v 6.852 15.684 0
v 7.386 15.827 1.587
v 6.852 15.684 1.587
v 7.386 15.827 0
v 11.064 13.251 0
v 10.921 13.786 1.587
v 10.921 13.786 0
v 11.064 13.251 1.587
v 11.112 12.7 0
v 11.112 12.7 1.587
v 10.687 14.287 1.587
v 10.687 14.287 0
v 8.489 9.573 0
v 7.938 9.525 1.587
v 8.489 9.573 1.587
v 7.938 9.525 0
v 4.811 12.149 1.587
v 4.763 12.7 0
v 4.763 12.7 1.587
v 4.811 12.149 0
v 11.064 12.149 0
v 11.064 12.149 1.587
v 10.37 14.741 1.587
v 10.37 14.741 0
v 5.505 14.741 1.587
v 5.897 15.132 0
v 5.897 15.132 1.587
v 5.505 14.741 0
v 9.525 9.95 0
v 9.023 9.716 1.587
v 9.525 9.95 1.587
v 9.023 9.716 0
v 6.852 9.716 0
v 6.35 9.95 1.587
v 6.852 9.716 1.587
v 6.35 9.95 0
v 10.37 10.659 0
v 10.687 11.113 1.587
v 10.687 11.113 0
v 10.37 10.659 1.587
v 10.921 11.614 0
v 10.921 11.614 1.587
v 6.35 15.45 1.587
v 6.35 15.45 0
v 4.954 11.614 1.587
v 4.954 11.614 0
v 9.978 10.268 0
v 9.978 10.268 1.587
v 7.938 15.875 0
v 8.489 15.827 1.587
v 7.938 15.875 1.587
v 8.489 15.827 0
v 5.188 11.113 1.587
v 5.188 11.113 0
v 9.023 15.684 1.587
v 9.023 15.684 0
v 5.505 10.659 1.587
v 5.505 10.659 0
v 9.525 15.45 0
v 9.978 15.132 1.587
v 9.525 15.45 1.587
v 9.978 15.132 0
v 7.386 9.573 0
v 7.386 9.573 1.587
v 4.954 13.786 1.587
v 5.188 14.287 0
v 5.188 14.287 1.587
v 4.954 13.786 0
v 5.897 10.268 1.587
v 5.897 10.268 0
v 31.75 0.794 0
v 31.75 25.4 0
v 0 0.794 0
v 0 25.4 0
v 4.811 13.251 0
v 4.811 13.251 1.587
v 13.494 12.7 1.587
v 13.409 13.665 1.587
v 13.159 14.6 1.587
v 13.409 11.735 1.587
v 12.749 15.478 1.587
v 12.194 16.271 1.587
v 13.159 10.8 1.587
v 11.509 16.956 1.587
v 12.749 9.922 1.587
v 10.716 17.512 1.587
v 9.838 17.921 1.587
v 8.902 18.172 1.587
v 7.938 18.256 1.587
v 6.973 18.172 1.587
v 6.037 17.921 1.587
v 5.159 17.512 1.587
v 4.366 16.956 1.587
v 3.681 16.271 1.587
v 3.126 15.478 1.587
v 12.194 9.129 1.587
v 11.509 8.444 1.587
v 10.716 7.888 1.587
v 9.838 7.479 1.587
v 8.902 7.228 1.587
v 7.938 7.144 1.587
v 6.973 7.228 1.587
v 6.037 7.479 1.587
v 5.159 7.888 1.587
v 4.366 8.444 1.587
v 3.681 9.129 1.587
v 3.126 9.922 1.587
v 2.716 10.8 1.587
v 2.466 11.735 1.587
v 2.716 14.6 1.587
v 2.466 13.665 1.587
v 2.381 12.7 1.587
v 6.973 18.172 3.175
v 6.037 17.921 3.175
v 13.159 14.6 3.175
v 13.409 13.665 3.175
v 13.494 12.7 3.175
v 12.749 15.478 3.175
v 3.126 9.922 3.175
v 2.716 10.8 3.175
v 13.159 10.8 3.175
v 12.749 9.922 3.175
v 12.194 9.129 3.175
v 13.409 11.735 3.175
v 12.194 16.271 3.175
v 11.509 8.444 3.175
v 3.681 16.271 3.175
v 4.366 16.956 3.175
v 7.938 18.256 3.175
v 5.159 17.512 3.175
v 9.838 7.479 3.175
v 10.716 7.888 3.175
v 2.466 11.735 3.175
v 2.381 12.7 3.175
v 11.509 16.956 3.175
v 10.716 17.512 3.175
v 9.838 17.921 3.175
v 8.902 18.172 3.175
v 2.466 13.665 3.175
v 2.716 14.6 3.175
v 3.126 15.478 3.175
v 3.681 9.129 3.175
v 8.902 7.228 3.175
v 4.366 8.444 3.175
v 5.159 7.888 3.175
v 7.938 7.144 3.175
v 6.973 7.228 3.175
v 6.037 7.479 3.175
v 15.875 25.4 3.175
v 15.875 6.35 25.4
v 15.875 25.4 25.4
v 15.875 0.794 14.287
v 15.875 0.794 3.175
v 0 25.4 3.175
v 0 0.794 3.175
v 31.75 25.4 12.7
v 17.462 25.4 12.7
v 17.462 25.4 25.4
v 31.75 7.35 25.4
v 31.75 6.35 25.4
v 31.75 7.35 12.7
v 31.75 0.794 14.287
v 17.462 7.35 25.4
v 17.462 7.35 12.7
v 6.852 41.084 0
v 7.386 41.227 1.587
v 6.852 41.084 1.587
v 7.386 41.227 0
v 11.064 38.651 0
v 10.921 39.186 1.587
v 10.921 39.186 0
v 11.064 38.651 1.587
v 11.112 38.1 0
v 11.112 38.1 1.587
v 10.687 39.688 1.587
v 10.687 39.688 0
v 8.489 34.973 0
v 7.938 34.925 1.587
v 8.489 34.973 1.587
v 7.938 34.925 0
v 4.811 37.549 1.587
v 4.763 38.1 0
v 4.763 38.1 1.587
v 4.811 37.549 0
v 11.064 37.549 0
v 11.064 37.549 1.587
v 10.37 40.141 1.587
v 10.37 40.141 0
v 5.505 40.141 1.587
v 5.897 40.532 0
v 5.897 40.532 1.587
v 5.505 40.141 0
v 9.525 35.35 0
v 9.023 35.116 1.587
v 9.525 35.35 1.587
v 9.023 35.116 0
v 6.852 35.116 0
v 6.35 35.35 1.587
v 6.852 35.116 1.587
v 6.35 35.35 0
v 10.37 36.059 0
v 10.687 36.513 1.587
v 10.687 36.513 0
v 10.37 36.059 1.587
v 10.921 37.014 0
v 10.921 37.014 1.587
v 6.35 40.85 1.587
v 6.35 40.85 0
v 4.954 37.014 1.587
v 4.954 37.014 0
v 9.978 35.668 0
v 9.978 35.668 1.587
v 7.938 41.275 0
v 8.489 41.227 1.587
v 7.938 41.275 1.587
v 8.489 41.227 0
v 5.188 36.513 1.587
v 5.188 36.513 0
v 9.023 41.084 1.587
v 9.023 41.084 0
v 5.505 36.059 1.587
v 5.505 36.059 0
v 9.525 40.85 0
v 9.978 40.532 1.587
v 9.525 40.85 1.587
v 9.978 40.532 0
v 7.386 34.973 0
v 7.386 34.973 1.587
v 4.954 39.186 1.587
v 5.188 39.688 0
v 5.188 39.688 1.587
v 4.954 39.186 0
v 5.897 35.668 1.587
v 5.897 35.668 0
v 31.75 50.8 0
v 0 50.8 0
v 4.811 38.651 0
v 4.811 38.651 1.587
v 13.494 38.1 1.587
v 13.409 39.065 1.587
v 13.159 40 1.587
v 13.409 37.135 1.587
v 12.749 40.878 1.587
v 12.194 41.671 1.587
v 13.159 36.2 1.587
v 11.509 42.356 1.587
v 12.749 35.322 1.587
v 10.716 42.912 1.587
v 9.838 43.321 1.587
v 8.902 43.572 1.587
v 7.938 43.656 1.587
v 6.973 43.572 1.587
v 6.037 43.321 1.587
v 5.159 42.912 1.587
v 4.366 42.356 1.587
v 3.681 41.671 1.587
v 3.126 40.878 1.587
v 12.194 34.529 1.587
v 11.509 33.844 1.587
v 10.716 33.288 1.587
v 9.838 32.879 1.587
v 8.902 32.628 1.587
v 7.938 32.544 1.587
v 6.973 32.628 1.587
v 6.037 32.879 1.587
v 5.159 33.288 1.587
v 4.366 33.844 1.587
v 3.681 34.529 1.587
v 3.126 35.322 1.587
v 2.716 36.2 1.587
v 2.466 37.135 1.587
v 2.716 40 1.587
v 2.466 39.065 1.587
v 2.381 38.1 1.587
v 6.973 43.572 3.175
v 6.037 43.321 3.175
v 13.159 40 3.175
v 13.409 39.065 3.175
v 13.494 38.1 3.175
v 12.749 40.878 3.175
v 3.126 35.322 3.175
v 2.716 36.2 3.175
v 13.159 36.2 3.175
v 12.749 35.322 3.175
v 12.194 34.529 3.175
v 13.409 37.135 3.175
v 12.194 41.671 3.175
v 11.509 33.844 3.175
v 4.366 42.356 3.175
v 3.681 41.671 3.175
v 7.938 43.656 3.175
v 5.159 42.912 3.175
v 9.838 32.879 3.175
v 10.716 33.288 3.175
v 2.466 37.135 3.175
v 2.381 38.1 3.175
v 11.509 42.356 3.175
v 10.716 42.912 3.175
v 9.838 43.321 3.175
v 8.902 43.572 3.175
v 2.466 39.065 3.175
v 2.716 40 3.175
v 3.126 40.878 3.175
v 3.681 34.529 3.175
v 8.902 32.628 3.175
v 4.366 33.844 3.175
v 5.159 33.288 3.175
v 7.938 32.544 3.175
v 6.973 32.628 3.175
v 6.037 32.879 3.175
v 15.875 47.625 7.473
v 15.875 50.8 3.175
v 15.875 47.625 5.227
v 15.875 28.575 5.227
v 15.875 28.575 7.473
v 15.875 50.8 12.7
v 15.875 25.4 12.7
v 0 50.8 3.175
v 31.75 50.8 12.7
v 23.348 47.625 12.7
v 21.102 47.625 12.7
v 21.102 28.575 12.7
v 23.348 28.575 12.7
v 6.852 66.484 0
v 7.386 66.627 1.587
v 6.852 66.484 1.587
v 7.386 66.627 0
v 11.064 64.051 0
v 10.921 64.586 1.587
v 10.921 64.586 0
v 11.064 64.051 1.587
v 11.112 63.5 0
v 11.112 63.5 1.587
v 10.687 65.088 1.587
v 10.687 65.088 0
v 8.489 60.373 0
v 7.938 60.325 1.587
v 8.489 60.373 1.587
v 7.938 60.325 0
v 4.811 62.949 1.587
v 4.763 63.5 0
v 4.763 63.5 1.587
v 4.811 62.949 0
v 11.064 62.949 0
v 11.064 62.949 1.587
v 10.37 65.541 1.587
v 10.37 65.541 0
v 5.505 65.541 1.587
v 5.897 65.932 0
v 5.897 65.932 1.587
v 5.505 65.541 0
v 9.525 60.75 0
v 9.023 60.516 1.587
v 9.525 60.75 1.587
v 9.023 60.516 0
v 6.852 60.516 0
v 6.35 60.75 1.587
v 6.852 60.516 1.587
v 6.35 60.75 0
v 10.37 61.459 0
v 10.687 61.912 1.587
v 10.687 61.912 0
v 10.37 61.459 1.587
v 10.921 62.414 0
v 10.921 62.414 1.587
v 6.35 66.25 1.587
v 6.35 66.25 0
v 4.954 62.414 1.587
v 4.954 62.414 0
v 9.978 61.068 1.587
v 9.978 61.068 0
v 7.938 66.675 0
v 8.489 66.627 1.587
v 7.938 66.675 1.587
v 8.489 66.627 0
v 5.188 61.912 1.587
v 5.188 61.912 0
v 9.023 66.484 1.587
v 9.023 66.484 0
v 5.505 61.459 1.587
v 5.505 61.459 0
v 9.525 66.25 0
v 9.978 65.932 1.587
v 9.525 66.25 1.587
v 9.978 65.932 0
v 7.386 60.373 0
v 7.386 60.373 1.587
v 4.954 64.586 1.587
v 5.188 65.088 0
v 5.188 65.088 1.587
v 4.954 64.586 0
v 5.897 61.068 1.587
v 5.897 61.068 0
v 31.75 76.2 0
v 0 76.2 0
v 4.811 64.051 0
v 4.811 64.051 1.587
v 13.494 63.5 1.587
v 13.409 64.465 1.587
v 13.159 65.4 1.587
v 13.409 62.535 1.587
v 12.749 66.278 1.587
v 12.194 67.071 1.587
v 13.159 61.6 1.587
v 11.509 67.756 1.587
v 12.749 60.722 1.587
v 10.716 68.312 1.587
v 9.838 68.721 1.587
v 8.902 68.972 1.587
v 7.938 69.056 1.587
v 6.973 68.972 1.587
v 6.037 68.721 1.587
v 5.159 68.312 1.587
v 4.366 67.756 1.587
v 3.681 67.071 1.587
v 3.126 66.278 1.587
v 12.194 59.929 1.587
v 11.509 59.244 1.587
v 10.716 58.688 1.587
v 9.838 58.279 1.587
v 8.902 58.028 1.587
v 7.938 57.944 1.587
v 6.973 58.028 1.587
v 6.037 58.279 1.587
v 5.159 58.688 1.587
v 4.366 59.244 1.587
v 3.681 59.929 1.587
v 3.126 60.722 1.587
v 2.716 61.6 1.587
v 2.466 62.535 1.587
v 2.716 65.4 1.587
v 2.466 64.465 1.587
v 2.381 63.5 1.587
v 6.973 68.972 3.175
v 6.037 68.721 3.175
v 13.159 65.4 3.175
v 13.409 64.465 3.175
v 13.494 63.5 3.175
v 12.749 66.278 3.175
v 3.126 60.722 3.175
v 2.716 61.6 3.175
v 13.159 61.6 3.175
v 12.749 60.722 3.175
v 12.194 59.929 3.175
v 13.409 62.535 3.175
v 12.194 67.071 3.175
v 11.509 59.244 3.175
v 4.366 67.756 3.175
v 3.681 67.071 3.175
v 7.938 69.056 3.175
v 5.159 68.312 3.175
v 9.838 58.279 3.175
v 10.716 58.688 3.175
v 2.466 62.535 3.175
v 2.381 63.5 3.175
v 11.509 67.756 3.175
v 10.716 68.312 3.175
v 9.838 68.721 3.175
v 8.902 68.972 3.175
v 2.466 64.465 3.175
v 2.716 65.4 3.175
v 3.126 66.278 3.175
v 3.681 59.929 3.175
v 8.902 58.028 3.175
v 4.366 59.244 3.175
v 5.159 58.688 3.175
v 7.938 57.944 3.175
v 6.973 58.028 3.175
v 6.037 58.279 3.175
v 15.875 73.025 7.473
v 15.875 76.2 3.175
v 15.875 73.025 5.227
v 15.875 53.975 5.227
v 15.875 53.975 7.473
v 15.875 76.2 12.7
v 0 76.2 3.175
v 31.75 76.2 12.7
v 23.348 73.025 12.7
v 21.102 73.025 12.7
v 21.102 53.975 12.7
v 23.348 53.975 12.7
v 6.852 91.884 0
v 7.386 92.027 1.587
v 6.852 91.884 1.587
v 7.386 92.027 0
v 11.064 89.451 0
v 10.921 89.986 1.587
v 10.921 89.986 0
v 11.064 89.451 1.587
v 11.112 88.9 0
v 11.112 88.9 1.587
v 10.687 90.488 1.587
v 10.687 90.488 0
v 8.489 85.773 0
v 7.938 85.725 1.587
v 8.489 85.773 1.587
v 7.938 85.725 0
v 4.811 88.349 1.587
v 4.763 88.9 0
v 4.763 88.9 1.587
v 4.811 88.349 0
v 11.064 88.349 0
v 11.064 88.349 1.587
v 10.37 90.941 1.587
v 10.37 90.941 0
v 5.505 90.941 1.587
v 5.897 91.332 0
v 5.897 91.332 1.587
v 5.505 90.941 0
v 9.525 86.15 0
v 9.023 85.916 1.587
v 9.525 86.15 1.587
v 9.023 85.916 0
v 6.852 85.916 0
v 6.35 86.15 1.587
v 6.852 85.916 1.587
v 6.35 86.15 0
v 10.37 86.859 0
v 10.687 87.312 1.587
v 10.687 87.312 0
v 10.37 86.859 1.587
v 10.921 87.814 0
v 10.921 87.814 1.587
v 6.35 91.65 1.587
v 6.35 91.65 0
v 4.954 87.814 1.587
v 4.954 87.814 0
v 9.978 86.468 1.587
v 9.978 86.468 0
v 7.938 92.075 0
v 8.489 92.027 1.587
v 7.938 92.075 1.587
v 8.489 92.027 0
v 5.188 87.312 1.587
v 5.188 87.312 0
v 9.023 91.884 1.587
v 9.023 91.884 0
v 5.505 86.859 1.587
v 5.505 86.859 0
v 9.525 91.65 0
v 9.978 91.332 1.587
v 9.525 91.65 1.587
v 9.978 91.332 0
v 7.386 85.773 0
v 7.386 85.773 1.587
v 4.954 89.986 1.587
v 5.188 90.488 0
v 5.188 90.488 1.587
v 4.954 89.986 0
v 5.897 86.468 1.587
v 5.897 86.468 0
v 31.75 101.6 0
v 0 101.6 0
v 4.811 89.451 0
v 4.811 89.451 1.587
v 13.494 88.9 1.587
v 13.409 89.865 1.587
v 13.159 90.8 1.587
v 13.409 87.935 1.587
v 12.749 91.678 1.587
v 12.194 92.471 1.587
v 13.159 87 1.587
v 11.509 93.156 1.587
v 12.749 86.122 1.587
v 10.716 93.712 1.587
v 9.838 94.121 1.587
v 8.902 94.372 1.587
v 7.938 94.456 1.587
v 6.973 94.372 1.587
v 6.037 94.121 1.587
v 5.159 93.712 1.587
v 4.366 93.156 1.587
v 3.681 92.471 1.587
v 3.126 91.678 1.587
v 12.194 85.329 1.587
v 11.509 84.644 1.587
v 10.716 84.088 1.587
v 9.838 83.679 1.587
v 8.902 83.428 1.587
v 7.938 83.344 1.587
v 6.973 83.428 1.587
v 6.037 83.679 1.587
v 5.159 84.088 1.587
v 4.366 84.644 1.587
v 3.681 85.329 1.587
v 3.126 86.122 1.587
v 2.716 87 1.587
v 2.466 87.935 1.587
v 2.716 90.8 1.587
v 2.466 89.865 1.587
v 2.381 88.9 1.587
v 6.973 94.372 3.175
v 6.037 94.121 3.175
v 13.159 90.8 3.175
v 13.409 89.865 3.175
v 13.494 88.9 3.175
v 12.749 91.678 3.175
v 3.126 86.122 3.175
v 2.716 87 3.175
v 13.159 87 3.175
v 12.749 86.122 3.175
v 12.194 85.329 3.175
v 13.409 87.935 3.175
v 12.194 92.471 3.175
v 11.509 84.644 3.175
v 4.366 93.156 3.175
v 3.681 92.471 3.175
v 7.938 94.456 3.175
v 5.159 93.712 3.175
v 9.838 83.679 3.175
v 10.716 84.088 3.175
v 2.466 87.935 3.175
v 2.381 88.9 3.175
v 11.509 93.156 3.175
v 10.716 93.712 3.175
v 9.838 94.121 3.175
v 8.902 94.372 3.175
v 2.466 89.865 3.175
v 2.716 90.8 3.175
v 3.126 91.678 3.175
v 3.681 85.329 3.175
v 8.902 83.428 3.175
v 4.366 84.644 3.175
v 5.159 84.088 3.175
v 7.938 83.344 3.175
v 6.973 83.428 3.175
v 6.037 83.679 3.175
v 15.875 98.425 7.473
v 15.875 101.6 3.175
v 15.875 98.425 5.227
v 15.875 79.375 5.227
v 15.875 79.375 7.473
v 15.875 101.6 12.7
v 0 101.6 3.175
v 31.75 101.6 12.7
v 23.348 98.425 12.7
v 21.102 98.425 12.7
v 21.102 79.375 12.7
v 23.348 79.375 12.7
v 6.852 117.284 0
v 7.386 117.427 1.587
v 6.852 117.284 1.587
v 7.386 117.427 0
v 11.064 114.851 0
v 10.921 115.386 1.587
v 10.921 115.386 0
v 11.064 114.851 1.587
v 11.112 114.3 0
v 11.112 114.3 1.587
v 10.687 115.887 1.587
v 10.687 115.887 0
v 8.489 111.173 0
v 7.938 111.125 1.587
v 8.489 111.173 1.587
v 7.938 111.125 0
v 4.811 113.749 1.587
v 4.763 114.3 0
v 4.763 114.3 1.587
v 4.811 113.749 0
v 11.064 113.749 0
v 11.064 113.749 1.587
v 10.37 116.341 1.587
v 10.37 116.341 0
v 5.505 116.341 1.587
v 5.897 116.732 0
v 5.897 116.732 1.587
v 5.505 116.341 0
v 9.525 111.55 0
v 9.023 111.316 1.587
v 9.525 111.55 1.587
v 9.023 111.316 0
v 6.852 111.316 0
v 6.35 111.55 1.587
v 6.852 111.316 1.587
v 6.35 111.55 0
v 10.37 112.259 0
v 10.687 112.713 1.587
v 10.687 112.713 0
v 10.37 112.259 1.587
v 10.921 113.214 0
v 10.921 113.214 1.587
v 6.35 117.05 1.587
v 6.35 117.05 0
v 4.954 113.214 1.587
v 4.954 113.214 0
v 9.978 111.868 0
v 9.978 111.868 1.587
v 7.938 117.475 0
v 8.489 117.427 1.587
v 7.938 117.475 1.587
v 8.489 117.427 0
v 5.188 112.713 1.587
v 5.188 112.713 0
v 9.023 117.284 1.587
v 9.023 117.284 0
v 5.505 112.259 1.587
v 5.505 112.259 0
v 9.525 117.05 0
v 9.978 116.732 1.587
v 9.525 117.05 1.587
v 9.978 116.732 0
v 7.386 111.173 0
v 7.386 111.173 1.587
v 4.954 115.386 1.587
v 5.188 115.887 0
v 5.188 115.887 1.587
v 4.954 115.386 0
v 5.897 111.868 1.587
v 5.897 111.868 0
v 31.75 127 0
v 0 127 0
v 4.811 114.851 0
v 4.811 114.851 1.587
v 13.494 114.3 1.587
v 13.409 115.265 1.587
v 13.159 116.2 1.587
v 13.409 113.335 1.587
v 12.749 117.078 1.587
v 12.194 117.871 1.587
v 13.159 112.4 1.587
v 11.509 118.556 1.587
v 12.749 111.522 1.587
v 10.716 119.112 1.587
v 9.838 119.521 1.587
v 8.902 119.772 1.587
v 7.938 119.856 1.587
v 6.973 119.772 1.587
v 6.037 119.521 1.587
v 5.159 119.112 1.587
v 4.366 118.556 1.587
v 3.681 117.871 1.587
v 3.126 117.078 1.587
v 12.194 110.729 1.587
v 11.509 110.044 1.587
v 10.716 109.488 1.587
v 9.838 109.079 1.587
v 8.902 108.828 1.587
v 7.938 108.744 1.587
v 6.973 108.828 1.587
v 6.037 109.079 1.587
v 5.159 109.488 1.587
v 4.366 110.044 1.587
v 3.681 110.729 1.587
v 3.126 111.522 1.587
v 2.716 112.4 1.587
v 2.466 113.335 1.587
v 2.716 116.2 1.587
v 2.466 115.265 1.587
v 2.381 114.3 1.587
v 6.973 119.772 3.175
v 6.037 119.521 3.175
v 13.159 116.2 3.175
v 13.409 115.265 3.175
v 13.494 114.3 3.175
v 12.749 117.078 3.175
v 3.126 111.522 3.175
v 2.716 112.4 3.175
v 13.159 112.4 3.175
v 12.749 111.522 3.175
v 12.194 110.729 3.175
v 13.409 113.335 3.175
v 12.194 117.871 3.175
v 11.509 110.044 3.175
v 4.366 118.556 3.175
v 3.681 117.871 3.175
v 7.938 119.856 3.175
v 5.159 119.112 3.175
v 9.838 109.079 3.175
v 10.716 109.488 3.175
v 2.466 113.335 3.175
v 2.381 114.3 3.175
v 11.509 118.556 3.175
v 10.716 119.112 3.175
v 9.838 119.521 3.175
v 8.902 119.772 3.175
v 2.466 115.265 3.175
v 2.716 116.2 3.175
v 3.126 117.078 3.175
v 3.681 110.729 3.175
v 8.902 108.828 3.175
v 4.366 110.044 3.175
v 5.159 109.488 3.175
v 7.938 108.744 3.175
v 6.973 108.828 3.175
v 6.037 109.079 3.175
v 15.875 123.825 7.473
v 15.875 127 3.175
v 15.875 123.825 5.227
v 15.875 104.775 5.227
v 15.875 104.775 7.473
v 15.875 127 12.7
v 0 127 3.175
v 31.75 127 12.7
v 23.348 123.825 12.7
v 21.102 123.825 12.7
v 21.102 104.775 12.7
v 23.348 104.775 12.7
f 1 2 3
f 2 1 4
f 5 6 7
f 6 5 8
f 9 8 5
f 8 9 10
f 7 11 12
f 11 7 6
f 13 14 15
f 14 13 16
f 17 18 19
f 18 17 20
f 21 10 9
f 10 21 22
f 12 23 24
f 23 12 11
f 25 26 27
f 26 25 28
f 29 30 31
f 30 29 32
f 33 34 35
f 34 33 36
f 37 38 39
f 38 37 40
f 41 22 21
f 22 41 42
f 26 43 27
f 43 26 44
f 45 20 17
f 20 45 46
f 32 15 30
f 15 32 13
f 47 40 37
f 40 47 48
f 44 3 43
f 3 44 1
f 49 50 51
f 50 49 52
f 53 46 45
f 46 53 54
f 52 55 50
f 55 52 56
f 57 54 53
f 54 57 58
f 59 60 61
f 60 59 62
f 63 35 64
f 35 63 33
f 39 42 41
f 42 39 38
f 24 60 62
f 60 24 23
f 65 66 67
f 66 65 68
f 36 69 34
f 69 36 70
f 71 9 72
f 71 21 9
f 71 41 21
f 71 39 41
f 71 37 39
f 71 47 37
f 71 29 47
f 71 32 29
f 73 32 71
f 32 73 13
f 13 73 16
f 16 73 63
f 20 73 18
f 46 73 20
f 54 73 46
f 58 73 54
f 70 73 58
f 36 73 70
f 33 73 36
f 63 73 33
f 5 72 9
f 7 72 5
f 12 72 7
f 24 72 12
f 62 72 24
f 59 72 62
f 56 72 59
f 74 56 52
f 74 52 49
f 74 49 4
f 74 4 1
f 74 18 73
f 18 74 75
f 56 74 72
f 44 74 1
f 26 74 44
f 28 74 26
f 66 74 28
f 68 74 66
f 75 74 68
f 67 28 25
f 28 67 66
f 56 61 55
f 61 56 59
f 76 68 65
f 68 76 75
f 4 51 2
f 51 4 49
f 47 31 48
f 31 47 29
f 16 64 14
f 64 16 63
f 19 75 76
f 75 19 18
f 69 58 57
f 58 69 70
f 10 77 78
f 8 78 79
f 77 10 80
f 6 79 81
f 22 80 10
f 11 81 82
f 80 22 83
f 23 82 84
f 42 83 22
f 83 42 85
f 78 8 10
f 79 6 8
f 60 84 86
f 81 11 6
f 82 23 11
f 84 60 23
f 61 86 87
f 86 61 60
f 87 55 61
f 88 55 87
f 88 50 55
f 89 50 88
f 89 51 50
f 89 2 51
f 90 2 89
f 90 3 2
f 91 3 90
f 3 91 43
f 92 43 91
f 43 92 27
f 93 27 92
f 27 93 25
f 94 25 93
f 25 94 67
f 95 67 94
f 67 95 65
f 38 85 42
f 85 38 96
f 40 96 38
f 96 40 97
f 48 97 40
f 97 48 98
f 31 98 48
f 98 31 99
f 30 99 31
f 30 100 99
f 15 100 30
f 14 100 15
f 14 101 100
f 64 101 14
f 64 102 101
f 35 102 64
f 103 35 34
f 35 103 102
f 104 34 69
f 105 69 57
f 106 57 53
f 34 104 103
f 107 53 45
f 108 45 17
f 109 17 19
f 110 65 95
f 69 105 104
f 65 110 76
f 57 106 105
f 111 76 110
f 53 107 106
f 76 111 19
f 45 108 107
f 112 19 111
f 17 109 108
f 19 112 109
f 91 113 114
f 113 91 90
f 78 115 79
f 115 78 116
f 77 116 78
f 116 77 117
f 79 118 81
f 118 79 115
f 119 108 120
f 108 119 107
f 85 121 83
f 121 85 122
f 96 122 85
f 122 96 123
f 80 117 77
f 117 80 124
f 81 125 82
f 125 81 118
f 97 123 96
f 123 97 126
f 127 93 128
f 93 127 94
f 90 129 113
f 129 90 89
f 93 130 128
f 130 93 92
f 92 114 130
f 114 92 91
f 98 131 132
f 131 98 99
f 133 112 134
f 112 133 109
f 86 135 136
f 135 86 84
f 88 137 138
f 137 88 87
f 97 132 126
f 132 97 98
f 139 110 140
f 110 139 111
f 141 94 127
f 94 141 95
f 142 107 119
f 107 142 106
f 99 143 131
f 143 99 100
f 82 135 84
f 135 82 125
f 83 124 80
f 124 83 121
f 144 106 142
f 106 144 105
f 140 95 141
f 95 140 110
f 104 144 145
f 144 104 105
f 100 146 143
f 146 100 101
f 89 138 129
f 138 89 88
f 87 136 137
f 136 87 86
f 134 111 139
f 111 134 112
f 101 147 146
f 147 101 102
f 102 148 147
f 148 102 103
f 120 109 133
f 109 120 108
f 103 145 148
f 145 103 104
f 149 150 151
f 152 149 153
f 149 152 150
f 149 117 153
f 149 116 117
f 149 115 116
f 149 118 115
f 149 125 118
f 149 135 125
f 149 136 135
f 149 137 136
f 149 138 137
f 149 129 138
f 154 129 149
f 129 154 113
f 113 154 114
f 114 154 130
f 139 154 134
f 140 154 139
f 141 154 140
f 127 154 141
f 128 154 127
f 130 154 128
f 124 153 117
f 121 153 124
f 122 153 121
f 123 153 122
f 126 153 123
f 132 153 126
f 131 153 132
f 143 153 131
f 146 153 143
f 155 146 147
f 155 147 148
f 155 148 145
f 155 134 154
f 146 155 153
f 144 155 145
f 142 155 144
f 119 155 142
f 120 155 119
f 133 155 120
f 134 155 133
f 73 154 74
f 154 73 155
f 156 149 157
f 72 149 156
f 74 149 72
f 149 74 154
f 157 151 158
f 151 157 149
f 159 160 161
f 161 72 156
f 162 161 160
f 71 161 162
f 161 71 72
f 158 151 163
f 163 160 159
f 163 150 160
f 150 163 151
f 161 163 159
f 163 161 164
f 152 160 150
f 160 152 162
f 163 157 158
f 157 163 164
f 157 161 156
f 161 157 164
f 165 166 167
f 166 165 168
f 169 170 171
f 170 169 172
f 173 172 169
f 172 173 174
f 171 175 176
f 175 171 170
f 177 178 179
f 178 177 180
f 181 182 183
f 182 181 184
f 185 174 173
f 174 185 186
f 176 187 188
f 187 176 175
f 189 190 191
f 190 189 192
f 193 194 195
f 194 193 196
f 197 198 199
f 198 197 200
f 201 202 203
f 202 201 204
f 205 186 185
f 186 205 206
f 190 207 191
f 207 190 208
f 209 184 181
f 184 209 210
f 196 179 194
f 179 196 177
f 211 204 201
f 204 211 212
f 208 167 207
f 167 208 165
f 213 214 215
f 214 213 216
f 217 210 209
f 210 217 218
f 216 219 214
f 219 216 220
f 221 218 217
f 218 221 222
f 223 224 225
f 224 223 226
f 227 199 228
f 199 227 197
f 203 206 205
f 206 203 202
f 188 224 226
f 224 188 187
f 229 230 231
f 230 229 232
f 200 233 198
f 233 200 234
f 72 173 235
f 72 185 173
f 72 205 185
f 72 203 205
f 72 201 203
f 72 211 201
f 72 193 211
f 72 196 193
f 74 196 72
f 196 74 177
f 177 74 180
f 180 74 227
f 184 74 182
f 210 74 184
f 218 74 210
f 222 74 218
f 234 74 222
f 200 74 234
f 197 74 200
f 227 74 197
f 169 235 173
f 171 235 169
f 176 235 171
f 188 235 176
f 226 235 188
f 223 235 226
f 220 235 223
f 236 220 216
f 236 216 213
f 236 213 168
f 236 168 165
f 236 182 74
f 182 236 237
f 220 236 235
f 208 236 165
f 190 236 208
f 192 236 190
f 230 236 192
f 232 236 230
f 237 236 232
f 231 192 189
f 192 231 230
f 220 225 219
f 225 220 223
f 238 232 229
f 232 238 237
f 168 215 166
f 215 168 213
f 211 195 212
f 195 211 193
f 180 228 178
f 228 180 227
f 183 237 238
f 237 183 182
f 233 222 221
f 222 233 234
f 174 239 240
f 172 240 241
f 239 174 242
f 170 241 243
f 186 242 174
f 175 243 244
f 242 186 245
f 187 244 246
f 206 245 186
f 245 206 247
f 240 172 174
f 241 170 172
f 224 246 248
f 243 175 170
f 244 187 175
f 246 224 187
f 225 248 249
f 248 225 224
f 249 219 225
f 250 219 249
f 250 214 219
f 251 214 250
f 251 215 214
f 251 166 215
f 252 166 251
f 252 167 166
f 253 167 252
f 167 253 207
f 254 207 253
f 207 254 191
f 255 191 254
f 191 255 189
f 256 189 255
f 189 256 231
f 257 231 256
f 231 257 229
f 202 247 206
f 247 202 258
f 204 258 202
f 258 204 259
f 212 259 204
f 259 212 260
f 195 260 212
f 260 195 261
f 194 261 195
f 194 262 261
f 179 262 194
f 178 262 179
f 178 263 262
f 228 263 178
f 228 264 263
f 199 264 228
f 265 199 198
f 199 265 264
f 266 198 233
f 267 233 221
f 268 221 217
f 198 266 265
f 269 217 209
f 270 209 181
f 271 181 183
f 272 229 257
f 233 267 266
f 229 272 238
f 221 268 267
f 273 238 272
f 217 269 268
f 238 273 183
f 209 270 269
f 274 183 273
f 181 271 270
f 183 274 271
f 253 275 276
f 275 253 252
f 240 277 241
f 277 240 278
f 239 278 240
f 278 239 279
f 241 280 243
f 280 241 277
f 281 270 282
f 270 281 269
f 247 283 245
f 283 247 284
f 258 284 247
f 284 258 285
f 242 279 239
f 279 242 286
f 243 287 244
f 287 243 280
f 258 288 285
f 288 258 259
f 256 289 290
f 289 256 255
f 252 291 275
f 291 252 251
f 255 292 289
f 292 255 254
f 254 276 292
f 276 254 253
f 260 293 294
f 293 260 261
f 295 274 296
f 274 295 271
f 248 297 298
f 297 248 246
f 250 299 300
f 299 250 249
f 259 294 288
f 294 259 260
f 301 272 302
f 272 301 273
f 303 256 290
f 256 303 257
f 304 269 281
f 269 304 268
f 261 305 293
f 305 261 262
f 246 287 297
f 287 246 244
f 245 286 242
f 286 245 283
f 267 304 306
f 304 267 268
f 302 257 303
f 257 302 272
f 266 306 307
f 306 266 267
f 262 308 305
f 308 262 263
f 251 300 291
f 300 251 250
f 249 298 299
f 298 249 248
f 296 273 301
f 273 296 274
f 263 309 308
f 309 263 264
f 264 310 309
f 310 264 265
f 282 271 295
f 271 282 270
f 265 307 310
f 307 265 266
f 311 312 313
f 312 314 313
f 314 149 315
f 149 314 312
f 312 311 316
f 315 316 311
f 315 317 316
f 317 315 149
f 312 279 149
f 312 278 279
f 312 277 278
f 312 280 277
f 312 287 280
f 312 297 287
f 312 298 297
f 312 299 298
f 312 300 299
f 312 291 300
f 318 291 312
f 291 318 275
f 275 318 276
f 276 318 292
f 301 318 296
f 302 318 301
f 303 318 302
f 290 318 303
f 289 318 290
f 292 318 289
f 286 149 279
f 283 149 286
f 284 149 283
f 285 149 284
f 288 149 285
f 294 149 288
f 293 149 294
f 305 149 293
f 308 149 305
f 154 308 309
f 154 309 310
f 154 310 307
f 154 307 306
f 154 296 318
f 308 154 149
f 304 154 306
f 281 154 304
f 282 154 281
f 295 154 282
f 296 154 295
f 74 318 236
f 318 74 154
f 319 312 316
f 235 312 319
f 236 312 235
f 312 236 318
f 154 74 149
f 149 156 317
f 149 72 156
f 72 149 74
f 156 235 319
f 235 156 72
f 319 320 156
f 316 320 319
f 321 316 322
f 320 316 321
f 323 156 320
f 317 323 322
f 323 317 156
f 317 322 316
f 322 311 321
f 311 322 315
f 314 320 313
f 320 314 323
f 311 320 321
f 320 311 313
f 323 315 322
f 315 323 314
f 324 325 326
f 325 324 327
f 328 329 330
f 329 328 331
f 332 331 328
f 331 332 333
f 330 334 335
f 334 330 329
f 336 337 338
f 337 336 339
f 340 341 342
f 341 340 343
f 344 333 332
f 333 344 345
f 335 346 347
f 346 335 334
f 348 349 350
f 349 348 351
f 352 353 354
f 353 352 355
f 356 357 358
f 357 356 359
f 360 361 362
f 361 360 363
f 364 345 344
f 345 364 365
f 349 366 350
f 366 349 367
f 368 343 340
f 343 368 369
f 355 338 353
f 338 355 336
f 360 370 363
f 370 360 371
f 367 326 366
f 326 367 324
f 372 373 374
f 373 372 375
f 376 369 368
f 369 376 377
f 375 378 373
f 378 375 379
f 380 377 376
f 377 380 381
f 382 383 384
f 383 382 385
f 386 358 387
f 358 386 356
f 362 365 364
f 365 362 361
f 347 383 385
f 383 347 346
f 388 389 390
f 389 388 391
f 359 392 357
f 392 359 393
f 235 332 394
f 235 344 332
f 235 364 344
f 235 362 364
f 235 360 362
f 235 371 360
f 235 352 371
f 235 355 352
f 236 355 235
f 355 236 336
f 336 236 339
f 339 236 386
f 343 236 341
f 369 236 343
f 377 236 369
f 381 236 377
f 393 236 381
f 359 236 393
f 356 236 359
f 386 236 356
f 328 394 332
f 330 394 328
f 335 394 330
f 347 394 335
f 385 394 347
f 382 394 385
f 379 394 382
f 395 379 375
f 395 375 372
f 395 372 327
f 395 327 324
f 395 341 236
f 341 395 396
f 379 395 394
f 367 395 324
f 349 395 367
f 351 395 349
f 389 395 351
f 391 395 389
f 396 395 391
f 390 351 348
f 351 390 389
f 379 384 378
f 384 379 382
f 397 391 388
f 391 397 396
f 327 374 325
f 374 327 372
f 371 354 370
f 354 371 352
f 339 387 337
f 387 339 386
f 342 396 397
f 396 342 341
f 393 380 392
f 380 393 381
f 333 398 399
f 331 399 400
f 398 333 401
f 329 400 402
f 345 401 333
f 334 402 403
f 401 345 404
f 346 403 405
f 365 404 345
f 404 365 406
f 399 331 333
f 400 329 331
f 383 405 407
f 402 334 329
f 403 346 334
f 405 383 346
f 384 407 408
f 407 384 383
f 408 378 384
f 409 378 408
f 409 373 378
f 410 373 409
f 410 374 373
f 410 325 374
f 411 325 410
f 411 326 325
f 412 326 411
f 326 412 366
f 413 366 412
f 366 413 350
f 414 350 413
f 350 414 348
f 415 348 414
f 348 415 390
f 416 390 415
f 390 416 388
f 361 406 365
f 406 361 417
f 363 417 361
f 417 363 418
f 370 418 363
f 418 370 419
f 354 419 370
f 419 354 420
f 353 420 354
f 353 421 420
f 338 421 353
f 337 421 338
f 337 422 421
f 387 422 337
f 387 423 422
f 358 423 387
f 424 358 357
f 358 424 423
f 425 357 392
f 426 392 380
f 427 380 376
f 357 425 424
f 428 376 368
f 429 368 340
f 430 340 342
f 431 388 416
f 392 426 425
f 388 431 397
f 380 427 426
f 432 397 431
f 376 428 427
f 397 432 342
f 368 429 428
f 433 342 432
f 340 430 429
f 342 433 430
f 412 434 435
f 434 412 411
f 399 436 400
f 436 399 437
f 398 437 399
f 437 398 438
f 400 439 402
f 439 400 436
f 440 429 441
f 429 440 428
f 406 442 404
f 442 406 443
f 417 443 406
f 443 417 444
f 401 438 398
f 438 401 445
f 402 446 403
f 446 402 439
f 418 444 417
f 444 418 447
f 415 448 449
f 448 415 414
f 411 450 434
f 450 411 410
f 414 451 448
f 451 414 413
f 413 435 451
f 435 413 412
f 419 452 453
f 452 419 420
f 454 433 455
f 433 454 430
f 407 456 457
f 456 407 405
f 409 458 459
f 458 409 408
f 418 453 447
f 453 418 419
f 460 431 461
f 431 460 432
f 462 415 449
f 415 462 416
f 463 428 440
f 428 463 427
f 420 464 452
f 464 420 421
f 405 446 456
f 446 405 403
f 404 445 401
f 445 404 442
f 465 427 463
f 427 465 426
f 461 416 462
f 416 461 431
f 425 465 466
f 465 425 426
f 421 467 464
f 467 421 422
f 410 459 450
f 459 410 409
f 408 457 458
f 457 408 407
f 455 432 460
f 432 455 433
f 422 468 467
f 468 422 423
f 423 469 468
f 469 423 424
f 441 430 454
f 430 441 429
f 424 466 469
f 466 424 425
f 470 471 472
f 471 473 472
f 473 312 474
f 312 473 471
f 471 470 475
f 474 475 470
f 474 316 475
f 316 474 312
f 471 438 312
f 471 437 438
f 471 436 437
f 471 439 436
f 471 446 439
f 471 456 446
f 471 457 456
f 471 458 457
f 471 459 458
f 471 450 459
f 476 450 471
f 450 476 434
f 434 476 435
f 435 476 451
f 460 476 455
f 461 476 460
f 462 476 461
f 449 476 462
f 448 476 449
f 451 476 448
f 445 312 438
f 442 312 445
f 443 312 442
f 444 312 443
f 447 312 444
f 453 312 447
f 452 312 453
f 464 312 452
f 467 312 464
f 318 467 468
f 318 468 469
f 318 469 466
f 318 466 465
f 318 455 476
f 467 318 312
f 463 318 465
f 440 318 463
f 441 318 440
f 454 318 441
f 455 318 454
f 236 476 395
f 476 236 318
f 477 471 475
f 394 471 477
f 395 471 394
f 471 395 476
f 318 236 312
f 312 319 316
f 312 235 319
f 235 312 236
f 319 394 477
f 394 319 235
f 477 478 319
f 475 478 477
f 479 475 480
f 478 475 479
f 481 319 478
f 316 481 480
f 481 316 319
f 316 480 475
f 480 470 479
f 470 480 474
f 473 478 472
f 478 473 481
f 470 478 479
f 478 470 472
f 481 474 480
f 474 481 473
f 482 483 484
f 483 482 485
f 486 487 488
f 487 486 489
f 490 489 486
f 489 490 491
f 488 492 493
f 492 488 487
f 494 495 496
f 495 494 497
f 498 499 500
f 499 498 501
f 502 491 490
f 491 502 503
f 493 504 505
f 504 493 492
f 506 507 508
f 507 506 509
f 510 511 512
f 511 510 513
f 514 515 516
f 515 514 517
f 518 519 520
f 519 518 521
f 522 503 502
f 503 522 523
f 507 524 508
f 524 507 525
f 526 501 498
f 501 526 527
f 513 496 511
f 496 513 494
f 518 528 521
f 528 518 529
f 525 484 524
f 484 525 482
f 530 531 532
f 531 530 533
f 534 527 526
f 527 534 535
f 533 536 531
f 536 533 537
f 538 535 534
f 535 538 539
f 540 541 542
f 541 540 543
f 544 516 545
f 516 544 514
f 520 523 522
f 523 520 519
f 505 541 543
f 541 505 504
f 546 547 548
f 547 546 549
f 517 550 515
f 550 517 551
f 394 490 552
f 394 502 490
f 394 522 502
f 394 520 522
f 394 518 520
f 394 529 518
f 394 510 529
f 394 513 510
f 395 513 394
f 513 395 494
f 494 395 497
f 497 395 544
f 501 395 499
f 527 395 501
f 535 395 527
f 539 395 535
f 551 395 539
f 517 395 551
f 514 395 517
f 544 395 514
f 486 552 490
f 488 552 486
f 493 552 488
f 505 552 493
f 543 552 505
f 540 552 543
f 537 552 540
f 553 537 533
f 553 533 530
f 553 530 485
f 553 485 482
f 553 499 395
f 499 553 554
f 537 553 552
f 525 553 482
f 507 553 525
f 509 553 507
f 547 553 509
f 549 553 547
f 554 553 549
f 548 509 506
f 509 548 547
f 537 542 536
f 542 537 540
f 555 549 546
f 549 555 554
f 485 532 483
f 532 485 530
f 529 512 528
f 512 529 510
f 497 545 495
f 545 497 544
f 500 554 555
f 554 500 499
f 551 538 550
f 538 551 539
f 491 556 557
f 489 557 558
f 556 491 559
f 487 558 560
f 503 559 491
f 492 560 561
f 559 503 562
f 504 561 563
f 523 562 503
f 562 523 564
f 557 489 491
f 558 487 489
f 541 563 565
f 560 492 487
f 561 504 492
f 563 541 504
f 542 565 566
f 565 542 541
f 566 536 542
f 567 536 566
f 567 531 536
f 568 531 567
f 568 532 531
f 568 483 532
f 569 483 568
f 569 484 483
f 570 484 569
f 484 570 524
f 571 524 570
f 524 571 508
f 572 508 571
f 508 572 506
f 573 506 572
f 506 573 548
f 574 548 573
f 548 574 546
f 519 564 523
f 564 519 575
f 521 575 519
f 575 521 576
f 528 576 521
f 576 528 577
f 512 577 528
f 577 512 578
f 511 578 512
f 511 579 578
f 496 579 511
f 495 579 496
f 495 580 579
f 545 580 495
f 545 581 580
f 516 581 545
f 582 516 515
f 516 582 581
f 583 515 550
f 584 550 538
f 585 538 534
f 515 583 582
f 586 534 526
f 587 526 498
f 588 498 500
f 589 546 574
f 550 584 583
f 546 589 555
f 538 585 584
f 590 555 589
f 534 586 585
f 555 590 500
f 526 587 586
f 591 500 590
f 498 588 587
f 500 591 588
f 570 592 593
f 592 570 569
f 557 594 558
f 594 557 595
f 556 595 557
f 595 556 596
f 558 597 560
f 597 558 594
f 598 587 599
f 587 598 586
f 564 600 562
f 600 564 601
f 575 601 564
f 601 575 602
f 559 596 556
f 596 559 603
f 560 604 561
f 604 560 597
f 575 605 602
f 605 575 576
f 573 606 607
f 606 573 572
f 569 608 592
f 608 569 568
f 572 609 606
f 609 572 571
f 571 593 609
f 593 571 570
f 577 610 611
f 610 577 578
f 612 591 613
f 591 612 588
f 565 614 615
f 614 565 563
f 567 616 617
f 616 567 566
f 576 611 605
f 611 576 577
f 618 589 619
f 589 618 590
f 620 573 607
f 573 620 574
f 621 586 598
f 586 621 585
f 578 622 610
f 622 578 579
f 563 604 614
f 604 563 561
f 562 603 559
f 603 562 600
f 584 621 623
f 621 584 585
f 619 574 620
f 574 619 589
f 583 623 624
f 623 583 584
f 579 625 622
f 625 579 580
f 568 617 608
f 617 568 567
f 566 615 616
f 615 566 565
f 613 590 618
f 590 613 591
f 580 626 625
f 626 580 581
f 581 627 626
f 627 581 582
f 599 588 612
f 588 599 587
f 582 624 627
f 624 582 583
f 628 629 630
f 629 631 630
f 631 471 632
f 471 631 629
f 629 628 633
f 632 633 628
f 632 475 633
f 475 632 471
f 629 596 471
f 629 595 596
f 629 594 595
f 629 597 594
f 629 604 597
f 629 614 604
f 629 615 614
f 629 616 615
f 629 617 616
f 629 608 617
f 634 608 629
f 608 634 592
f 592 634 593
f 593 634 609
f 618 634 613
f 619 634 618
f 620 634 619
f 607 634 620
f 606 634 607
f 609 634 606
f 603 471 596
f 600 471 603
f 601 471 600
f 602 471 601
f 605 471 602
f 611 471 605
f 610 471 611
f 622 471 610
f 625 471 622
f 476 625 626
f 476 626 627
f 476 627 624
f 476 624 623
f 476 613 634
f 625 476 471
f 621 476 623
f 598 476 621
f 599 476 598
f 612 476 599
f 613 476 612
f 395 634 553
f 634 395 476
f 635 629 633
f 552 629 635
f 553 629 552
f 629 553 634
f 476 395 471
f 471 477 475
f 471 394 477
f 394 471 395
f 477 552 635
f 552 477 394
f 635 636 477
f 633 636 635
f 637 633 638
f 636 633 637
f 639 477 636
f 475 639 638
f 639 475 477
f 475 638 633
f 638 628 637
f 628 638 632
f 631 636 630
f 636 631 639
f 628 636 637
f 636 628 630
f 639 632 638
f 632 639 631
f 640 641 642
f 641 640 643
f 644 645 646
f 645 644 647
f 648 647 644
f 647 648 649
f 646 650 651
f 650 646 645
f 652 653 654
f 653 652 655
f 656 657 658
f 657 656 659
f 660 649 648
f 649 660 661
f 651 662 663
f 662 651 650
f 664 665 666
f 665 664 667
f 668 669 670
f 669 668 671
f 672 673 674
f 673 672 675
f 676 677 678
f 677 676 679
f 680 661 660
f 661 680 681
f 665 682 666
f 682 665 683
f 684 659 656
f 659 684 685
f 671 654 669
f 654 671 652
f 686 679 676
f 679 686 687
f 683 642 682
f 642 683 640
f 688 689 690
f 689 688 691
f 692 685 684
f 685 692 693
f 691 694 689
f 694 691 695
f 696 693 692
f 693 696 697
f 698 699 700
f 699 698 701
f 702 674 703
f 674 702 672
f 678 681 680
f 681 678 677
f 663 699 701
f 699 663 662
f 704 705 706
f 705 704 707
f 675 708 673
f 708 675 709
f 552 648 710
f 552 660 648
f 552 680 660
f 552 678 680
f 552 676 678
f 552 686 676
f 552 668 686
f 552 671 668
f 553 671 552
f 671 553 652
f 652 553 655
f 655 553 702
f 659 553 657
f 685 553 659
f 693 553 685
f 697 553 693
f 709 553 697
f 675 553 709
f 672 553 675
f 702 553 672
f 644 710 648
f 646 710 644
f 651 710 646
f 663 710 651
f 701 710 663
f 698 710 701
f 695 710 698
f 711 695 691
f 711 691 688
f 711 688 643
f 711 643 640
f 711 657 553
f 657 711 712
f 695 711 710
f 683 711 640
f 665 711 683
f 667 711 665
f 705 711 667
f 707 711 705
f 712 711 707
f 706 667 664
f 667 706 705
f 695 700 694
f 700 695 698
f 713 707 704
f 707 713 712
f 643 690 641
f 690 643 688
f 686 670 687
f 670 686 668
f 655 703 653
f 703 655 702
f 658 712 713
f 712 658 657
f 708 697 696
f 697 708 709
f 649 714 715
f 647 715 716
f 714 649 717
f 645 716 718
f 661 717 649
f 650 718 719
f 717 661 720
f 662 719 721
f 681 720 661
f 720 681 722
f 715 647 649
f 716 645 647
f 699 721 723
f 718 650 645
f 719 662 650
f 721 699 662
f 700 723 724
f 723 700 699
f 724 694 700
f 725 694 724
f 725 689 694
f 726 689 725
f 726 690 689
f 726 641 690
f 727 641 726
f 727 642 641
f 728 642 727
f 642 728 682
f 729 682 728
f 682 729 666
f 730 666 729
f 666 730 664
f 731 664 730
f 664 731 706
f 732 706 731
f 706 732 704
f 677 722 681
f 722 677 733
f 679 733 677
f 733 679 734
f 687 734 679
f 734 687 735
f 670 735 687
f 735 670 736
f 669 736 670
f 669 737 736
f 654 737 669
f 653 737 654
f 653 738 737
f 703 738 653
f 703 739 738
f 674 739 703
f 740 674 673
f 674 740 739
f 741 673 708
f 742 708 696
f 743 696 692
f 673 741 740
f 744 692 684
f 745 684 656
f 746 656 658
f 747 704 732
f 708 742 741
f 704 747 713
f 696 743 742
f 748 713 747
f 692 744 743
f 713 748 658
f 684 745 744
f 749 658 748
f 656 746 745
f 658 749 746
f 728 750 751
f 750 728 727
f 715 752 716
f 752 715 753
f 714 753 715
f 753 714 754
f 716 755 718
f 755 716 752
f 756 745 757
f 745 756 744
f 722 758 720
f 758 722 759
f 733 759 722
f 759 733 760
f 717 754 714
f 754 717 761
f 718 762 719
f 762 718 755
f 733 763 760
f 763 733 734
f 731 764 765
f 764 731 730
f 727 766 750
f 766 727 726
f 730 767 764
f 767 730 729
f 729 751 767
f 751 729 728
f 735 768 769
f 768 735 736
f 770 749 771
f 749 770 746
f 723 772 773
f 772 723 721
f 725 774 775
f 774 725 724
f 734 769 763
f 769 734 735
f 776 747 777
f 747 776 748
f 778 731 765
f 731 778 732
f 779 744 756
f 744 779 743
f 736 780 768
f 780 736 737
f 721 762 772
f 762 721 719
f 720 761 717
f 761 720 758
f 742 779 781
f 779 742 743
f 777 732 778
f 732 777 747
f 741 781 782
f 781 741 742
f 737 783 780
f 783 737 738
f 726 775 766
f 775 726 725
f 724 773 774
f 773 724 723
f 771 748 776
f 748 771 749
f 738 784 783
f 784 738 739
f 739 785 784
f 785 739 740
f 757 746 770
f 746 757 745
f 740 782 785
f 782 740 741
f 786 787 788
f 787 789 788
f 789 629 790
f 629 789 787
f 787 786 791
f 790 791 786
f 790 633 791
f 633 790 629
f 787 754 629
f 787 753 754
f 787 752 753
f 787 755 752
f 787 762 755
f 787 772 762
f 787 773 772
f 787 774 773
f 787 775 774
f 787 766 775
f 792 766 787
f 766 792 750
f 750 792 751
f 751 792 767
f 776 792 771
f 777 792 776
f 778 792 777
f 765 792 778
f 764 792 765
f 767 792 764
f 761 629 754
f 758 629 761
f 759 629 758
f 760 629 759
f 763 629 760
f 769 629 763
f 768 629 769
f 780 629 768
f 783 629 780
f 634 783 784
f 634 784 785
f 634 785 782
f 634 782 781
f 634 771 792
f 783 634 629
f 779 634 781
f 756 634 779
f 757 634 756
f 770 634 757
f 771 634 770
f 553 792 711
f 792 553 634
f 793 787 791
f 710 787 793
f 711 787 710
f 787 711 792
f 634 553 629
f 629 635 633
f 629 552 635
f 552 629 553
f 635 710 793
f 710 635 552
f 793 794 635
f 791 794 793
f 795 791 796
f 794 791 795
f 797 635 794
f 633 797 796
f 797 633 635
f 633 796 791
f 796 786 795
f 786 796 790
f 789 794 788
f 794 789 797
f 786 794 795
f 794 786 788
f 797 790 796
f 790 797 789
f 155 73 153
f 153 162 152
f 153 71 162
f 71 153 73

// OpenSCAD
// Structured Media Center bracket generator
// Copyright 2018 - Mike Ryan (falter@gmail.com)

/* [Spacing] */
// Spacing between holes (center-to-center) of rows, in inches.
row_spacing_inches=1;
// Spacing between holes (center-to-center) of columns, in inches.
col_spacing_inches=[3,3,0.625];

/* [Main] */
part = "left"; // [left:Left Mount, right:Right Mount]
// number of rows
numberOfRows = 5; // [1:12]

/* [End Stop and Device Width Options] */


/* [Flange Options] */
// Type of Flange in Row 1
flange01 = 2; // [0:None, 1:Blank, 2:Hole]
// Type of Flange in Row 2
flange02 = 2; // [0:None, 1:Blank, 2:Hole]
// Type of Flange in Row 3
flange03 = 2; // [0:None, 1:Blank, 2:Hole]
// Type of Flange in Row 4
flange04 = 2; // [0:None, 1:Blank, 2:Hole]
// Type of Flange in Row 5
flange05 = 2; // [0:None, 1:Blank, 2:Hole]
// Type of Flange in Row 6
flange06 = 0; // [0:None, 1:Blank, 2:Hole]
// Type of Flange in Row 7
flange07 = 0; // [0:None, 1:Blank, 2:Hole]
// Type of Flange in Row 8
flange08 = 0; // [0:None, 1:Blank, 2:Hole]
// Type of Flange in Row 9
flange09 = 0; // [0:None, 1:Blank, 2:Hole]
// Type of Flange in Row 10
flange10 = 0; // [0:None, 1:Blank, 2:Hole]
// Type of Flange in Row 11
flange11 = 0; // [0:None, 1:Blank, 2:Hole]
// Type of Flange in Row 12
flange12 = 0; // [0:None, 1:Blank, 2:Hole]

/* [Support Block Options] */
// If set, a supportBlockXOffsetInches will be determined that will fit a device of deviceWidthInInches width
deviceWidthInInches = 0;

// support block x offset in inches
supportBlockXOffsetInches = 0.625;

// support block width in inches
supportBlockWidthInches = 0.625;

// support block x offset in inches
sideStopWidthInches= 0.0625;

// end stop height in inches
endStopHeightInches = 0.5;
// end stop width in inches
endStopWidthInches = 0.625;
// strap slot width in inches
strapSlotWidthInches = 0.75;
// Type of Support Block in Row 1
support_block01 = 5; // [ 0:None, 1:Block, 2:BlockWithStrap, 3:EndStop, 4:SideStop, 5:EndStopWithSideStop ]
// Type of Support Block in Row 2
support_block02 = 2; // [ 0:None, 1:Block, 2:BlockWithStrap, 3:EndStop, 4:SideStop, 5:EndStopWithSideStop ]
// Type of Support Block in Row 3
support_block03 = 2; // [ 0:None, 1:Block, 2:BlockWithStrap, 3:EndStop, 4:SideStop, 5:EndStopWithSideStop ]
// Type of Support Block in Row 4
support_block04 = 2; // [ 0:None, 1:Block, 2:BlockWithStrap, 3:EndStop, 4:SideStop, 5:EndStopWithSideStop ]
// Type of Support Block in Row 5
support_block05 = 2; // [ 0:None, 1:Block, 2:BlockWithStrap, 3:EndStop, 4:SideStop, 5:EndStopWithSideStop ]
// Type of Support Block in Row 6
support_block06 = 0; // [ 0:None, 1:Block, 2:BlockWithStrap, 3:EndStop, 4:SideStop, 5:EndStopWithSideStop ]
// Type of Support Block in Row 7
support_block07 = 0; // [ 0:None, 1:Block, 2:BlockWithStrap, 3:EndStop, 4:SideStop, 5:EndStopWithSideStop ]
// Type of Support Block in Row 8
support_block08 = 0; // [ 0:None, 1:Block, 2:BlockWithStrap, 3:EndStop, 4:SideStop, 5:EndStopWithSideStop ]
// Type of Support Block in Row 9
support_block09 = 0; // [ 0:None, 1:Block, 2:BlockWithStrap, 3:EndStop, 4:SideStop, 5:EndStopWithSideStop ]
// Type of Support Block in Row 10
support_block10 = 0; // [ 0:None, 1:Block, 2:BlockWithStrap, 3:EndStop, 4:SideStop, 5:EndStopWithSideStop ]
// Type of Support Block in Row 11
support_block11 = 0; // [ 0:None, 1:Block, 2:BlockWithStrap, 3:EndStop, 4:SideStop, 5:EndStopWithSideStop ]
// Type of Support Block in Row 12
support_block12 = 0; // [ 0:None, 1:Block, 2:BlockWithStrap, 3:EndStop, 4:SideStop, 5:EndStopWithSideStop ]

/* [Hidden] */
inch = 25.4;
$fn = 36;
// Constants
FLANGE_NONE  = 0;
FLANGE_BLANK = 1;
FLANGE_HOLE  = 2;

SUPPORT_BLOCK_NONE = 0;
SUPPORT_BLOCK_BLOCK = 1;
SUPPORT_BLOCK_WITH_STRAP = 2;
SUPPORT_BLOCK_WITH_END_STOP = 3;
SUPPORT_BLOCK_WITH_SIDE_STOP = 4;
SUPPORT_BLOCK_WITH_END_STOP_AND_SIDE_STOP = 5;


vertical_hole_spacing = row_spacing_inches * inch;
hole_diameter = 1/4 * inch;
hole_thickness = 1/16 * inch;
countersunk_hole_diameter = 7/16 * inch;
flange_thickness = 1/8 * inch;
flange_width_max = 5/8 * inch;
stop_side_width = sideStopWidthInches * inch;

function calc_block_x_offset_for_width(width, column = 0, r = -1) = r >= 0 ? r : calc_block_x_offset_for_width(width, column+1, r=((col_right_flange_offset(column) - col_left_flange_offset(0) - width)/2 - stop_side_width));


support_block_x_offset = deviceWidthInInches > 0 ? calc_block_x_offset_for_width(deviceWidthInInches*inch) : supportBlockXOffsetInches*inch;

flange_rows = [flange01,flange02,flange03,flange04,flange05,flange06,flange07,flange08,flange09,flange10,flange11,flange12];
support_block_rows = [support_block01,support_block02,support_block03,support_block04,support_block05,support_block06,support_block07,support_block08,support_block09,support_block10,support_block11,support_block12];

print_part();

module print_part() {
    if (part == "left") {
        make_mount();
    } else if (part == "right") {
        mirror([1,0,0]) make_mount();

    }
}

module make_mount() {
    scmMount(num_rows=numberOfRows,
                    stop_height=endStopHeightInches*inch,
                    support_block_width=supportBlockWidthInches * inch,
                    flange_rows=flange_rows,
                    support_block_rows=support_block_rows,
                    support_block_x_offset=support_block_x_offset,
                    stop_bottom_width=endStopWidthInches * inch,
                    stop_side_width=stop_side_width,
                    strap_slot_width=strapSlotWidthInches * inch
    );
}


function col_hole_offset(x = 0, i = 0, r = 0) =  i < x ? col_hole_offset(x, i + 1, r + col_spacing_inches[i%len(col_spacing_inches)]) : r*inch+flange_width_max/2;
function col_left_flange_offset(x) =  col_hole_offset(x) - flange_width_max/2;
function col_right_flange_offset(x) =  col_hole_offset(x) + flange_width_max/2;
function col_capacity(x) = col_right_flange_offset(x) - col_left_flange_offset(0) - 2*(support_block_x_offset+stop_side_width);
function row_hole_offset(y) = vertical_hole_spacing/2 + y * vertical_hole_spacing;
function row_offset_min(y) = row_hole_offset(y) - vertical_hole_spacing/2;
function row_offset_max(y) = row_offset_min(y) + vertical_hole_spacing;



module cabinetHoles() {
    holes(5,25,5);
}

module scmMount(num_rows=3,
                    strap_slot_width=0.75*inch, 
                    support_block_x_offset=flange_width_max,
                    support_block_width=0.5*inch, 
                    support_block_height=0.5*inch, 
                    flange_rows=[],
                    support_block_rows=[],
                    stop_side_width=1/16*inch,
                    stop_height=0.5*inch, 
                    stop_bottom_length=0.25*inch,
                    stop_bottom_width=0.5*inch,
                    ) {
    
    // TODO: use assert?
    if (support_block_x_offset < 0) {
        echo("ERROR: support_block_x_offset cannot be < 0");
    }

    all_rows = [ for ( zz = [0:1:num_rows-1] ) zz ] ;
    flange_width = max(flange_width_max, support_block_x_offset);
    flange_length = row_hole_offset(num_rows-1) + vertical_hole_spacing/2;
    flange_dims = [flange_width, vertical_hole_spacing, flange_thickness];
    support_block_dims = [support_block_width, vertical_hole_spacing, support_block_height];
    stop_bottom_dims = [stop_bottom_width, stop_bottom_length, stop_height];

    difference() {
        union() {
            for (x=[0:1:num_rows-1]) {
                translate([0,row_offset_min(x)]) {
                    // Create the flanges.
                    make_flange(flange_dims, flange_rows[x]);

                    translate([support_block_x_offset, 0, 0]) {
                        // Create the support blocks
                        if (support_block_rows[x] == SUPPORT_BLOCK_NONE) {
                            // NOP
                        } else if (support_block_rows[x] == SUPPORT_BLOCK_BLOCK) {
                            basic_support_block(support_block_dims);
                        } else if (support_block_rows[x] == SUPPORT_BLOCK_WITH_STRAP) {
                            strap_support(support_block_dims, strap_slot_width);
                        } else if (support_block_rows[x] == SUPPORT_BLOCK_WITH_END_STOP_AND_SIDE_STOP) {
                            make_stop_block(support_block_dims, stop_bottom_dims, stop_side_width);
                        } else if (support_block_rows[x] == SUPPORT_BLOCK_WITH_END_STOP) {
                            make_stop_block(support_block_dims, stop_bottom_dims, 0);
                        } else if (support_block_rows[x] == SUPPORT_BLOCK_WITH_SIDE_STOP) {
                            make_stop_block(support_block_dims, [0,0,stop_bottom_dims[2]], stop_side_width);
                        }

                    }
                }
            }
        }
        // Trim both the ends
        translate([0,0,0]) cube([support_block_x_offset + support_block_width, 1/32*inch, support_block_height+stop_height]);
        translate([0,row_offset_max(num_rows-1),0]) cube([support_block_x_offset + support_block_width, 1/32*inch, support_block_height+stop_height]);
    }

}

module basic_support_block(support_block_dims) {
    cube(support_block_dims);
}

module make_flange(flange_dims, mode) {
    difference() {
        if (mode == FLANGE_BLANK) {
            cube(flange_dims);
        } else if (mode == FLANGE_HOLE) {
            difference() {
                cube(flange_dims);
                hole(0,0);
            }
        } else if (mode == FLANGE_NONE) {
            // Nop

        } else {
            echo("ERROR: unknown flange mode: ", mode);
        }
    }
}

module strap_support(support_block_dims, strap_slot_width) {
    difference() {
        basic_support_block(support_block_dims);
        translate([0, support_block_dims[1]/2, 1/4*inch]) {
            rotate(a=[0,-45,0]) cube([1*inch, strap_slot_width, (1/16)*inch], center=true);
        };
    }
}

module make_stop_block(support_block_dims, stop_bottom_dims, stop_side_width) {
    basic_support_block(support_block_dims);
    translate([0,0,support_block_dims[2]-1]) {
        // Make bottom stop
        if (stop_bottom_dims[0] > 0 && stop_bottom_dims[1] > 0 && stop_bottom_dims[2] > 0) {
            hull() {
                cube([stop_bottom_dims[0], 1, 1]);
                translate([0,stop_bottom_dims[1],0])
                    cube([stop_bottom_dims[0], 1, stop_bottom_dims[2]+1]);
            }
        }
        // Make side stop
        if (stop_side_width > 0) {
                hull() {
                    translate([0,stop_bottom_dims[1]])
                        cube([stop_side_width,1,stop_bottom_dims[2]+1]);
                    translate([0,row_offset_max(0)-1, 0])
                        cube([stop_side_width,1,stop_bottom_dims[2]+1]);
                }
        }
    }
}

module holeOffset(column, row) {
    translate([col_hole_offset(column), row_hole_offset(row)]) children();
}

module hole(column, row) {
    holeOffset(column,row) {
        cylinder(d=hole_diameter, h = hole_thickness);
        translate([0,0,hole_thickness])
            cylinder(d=countersunk_hole_diameter, h = 10);
    }
}

// Lays out a pattern of holes 
module holes(columns, rows, height) {
    for (x=[0:1:columns]) {
        for (y=[0:1:rows]) {
            hole(x,y, height);
        }
    }
}
